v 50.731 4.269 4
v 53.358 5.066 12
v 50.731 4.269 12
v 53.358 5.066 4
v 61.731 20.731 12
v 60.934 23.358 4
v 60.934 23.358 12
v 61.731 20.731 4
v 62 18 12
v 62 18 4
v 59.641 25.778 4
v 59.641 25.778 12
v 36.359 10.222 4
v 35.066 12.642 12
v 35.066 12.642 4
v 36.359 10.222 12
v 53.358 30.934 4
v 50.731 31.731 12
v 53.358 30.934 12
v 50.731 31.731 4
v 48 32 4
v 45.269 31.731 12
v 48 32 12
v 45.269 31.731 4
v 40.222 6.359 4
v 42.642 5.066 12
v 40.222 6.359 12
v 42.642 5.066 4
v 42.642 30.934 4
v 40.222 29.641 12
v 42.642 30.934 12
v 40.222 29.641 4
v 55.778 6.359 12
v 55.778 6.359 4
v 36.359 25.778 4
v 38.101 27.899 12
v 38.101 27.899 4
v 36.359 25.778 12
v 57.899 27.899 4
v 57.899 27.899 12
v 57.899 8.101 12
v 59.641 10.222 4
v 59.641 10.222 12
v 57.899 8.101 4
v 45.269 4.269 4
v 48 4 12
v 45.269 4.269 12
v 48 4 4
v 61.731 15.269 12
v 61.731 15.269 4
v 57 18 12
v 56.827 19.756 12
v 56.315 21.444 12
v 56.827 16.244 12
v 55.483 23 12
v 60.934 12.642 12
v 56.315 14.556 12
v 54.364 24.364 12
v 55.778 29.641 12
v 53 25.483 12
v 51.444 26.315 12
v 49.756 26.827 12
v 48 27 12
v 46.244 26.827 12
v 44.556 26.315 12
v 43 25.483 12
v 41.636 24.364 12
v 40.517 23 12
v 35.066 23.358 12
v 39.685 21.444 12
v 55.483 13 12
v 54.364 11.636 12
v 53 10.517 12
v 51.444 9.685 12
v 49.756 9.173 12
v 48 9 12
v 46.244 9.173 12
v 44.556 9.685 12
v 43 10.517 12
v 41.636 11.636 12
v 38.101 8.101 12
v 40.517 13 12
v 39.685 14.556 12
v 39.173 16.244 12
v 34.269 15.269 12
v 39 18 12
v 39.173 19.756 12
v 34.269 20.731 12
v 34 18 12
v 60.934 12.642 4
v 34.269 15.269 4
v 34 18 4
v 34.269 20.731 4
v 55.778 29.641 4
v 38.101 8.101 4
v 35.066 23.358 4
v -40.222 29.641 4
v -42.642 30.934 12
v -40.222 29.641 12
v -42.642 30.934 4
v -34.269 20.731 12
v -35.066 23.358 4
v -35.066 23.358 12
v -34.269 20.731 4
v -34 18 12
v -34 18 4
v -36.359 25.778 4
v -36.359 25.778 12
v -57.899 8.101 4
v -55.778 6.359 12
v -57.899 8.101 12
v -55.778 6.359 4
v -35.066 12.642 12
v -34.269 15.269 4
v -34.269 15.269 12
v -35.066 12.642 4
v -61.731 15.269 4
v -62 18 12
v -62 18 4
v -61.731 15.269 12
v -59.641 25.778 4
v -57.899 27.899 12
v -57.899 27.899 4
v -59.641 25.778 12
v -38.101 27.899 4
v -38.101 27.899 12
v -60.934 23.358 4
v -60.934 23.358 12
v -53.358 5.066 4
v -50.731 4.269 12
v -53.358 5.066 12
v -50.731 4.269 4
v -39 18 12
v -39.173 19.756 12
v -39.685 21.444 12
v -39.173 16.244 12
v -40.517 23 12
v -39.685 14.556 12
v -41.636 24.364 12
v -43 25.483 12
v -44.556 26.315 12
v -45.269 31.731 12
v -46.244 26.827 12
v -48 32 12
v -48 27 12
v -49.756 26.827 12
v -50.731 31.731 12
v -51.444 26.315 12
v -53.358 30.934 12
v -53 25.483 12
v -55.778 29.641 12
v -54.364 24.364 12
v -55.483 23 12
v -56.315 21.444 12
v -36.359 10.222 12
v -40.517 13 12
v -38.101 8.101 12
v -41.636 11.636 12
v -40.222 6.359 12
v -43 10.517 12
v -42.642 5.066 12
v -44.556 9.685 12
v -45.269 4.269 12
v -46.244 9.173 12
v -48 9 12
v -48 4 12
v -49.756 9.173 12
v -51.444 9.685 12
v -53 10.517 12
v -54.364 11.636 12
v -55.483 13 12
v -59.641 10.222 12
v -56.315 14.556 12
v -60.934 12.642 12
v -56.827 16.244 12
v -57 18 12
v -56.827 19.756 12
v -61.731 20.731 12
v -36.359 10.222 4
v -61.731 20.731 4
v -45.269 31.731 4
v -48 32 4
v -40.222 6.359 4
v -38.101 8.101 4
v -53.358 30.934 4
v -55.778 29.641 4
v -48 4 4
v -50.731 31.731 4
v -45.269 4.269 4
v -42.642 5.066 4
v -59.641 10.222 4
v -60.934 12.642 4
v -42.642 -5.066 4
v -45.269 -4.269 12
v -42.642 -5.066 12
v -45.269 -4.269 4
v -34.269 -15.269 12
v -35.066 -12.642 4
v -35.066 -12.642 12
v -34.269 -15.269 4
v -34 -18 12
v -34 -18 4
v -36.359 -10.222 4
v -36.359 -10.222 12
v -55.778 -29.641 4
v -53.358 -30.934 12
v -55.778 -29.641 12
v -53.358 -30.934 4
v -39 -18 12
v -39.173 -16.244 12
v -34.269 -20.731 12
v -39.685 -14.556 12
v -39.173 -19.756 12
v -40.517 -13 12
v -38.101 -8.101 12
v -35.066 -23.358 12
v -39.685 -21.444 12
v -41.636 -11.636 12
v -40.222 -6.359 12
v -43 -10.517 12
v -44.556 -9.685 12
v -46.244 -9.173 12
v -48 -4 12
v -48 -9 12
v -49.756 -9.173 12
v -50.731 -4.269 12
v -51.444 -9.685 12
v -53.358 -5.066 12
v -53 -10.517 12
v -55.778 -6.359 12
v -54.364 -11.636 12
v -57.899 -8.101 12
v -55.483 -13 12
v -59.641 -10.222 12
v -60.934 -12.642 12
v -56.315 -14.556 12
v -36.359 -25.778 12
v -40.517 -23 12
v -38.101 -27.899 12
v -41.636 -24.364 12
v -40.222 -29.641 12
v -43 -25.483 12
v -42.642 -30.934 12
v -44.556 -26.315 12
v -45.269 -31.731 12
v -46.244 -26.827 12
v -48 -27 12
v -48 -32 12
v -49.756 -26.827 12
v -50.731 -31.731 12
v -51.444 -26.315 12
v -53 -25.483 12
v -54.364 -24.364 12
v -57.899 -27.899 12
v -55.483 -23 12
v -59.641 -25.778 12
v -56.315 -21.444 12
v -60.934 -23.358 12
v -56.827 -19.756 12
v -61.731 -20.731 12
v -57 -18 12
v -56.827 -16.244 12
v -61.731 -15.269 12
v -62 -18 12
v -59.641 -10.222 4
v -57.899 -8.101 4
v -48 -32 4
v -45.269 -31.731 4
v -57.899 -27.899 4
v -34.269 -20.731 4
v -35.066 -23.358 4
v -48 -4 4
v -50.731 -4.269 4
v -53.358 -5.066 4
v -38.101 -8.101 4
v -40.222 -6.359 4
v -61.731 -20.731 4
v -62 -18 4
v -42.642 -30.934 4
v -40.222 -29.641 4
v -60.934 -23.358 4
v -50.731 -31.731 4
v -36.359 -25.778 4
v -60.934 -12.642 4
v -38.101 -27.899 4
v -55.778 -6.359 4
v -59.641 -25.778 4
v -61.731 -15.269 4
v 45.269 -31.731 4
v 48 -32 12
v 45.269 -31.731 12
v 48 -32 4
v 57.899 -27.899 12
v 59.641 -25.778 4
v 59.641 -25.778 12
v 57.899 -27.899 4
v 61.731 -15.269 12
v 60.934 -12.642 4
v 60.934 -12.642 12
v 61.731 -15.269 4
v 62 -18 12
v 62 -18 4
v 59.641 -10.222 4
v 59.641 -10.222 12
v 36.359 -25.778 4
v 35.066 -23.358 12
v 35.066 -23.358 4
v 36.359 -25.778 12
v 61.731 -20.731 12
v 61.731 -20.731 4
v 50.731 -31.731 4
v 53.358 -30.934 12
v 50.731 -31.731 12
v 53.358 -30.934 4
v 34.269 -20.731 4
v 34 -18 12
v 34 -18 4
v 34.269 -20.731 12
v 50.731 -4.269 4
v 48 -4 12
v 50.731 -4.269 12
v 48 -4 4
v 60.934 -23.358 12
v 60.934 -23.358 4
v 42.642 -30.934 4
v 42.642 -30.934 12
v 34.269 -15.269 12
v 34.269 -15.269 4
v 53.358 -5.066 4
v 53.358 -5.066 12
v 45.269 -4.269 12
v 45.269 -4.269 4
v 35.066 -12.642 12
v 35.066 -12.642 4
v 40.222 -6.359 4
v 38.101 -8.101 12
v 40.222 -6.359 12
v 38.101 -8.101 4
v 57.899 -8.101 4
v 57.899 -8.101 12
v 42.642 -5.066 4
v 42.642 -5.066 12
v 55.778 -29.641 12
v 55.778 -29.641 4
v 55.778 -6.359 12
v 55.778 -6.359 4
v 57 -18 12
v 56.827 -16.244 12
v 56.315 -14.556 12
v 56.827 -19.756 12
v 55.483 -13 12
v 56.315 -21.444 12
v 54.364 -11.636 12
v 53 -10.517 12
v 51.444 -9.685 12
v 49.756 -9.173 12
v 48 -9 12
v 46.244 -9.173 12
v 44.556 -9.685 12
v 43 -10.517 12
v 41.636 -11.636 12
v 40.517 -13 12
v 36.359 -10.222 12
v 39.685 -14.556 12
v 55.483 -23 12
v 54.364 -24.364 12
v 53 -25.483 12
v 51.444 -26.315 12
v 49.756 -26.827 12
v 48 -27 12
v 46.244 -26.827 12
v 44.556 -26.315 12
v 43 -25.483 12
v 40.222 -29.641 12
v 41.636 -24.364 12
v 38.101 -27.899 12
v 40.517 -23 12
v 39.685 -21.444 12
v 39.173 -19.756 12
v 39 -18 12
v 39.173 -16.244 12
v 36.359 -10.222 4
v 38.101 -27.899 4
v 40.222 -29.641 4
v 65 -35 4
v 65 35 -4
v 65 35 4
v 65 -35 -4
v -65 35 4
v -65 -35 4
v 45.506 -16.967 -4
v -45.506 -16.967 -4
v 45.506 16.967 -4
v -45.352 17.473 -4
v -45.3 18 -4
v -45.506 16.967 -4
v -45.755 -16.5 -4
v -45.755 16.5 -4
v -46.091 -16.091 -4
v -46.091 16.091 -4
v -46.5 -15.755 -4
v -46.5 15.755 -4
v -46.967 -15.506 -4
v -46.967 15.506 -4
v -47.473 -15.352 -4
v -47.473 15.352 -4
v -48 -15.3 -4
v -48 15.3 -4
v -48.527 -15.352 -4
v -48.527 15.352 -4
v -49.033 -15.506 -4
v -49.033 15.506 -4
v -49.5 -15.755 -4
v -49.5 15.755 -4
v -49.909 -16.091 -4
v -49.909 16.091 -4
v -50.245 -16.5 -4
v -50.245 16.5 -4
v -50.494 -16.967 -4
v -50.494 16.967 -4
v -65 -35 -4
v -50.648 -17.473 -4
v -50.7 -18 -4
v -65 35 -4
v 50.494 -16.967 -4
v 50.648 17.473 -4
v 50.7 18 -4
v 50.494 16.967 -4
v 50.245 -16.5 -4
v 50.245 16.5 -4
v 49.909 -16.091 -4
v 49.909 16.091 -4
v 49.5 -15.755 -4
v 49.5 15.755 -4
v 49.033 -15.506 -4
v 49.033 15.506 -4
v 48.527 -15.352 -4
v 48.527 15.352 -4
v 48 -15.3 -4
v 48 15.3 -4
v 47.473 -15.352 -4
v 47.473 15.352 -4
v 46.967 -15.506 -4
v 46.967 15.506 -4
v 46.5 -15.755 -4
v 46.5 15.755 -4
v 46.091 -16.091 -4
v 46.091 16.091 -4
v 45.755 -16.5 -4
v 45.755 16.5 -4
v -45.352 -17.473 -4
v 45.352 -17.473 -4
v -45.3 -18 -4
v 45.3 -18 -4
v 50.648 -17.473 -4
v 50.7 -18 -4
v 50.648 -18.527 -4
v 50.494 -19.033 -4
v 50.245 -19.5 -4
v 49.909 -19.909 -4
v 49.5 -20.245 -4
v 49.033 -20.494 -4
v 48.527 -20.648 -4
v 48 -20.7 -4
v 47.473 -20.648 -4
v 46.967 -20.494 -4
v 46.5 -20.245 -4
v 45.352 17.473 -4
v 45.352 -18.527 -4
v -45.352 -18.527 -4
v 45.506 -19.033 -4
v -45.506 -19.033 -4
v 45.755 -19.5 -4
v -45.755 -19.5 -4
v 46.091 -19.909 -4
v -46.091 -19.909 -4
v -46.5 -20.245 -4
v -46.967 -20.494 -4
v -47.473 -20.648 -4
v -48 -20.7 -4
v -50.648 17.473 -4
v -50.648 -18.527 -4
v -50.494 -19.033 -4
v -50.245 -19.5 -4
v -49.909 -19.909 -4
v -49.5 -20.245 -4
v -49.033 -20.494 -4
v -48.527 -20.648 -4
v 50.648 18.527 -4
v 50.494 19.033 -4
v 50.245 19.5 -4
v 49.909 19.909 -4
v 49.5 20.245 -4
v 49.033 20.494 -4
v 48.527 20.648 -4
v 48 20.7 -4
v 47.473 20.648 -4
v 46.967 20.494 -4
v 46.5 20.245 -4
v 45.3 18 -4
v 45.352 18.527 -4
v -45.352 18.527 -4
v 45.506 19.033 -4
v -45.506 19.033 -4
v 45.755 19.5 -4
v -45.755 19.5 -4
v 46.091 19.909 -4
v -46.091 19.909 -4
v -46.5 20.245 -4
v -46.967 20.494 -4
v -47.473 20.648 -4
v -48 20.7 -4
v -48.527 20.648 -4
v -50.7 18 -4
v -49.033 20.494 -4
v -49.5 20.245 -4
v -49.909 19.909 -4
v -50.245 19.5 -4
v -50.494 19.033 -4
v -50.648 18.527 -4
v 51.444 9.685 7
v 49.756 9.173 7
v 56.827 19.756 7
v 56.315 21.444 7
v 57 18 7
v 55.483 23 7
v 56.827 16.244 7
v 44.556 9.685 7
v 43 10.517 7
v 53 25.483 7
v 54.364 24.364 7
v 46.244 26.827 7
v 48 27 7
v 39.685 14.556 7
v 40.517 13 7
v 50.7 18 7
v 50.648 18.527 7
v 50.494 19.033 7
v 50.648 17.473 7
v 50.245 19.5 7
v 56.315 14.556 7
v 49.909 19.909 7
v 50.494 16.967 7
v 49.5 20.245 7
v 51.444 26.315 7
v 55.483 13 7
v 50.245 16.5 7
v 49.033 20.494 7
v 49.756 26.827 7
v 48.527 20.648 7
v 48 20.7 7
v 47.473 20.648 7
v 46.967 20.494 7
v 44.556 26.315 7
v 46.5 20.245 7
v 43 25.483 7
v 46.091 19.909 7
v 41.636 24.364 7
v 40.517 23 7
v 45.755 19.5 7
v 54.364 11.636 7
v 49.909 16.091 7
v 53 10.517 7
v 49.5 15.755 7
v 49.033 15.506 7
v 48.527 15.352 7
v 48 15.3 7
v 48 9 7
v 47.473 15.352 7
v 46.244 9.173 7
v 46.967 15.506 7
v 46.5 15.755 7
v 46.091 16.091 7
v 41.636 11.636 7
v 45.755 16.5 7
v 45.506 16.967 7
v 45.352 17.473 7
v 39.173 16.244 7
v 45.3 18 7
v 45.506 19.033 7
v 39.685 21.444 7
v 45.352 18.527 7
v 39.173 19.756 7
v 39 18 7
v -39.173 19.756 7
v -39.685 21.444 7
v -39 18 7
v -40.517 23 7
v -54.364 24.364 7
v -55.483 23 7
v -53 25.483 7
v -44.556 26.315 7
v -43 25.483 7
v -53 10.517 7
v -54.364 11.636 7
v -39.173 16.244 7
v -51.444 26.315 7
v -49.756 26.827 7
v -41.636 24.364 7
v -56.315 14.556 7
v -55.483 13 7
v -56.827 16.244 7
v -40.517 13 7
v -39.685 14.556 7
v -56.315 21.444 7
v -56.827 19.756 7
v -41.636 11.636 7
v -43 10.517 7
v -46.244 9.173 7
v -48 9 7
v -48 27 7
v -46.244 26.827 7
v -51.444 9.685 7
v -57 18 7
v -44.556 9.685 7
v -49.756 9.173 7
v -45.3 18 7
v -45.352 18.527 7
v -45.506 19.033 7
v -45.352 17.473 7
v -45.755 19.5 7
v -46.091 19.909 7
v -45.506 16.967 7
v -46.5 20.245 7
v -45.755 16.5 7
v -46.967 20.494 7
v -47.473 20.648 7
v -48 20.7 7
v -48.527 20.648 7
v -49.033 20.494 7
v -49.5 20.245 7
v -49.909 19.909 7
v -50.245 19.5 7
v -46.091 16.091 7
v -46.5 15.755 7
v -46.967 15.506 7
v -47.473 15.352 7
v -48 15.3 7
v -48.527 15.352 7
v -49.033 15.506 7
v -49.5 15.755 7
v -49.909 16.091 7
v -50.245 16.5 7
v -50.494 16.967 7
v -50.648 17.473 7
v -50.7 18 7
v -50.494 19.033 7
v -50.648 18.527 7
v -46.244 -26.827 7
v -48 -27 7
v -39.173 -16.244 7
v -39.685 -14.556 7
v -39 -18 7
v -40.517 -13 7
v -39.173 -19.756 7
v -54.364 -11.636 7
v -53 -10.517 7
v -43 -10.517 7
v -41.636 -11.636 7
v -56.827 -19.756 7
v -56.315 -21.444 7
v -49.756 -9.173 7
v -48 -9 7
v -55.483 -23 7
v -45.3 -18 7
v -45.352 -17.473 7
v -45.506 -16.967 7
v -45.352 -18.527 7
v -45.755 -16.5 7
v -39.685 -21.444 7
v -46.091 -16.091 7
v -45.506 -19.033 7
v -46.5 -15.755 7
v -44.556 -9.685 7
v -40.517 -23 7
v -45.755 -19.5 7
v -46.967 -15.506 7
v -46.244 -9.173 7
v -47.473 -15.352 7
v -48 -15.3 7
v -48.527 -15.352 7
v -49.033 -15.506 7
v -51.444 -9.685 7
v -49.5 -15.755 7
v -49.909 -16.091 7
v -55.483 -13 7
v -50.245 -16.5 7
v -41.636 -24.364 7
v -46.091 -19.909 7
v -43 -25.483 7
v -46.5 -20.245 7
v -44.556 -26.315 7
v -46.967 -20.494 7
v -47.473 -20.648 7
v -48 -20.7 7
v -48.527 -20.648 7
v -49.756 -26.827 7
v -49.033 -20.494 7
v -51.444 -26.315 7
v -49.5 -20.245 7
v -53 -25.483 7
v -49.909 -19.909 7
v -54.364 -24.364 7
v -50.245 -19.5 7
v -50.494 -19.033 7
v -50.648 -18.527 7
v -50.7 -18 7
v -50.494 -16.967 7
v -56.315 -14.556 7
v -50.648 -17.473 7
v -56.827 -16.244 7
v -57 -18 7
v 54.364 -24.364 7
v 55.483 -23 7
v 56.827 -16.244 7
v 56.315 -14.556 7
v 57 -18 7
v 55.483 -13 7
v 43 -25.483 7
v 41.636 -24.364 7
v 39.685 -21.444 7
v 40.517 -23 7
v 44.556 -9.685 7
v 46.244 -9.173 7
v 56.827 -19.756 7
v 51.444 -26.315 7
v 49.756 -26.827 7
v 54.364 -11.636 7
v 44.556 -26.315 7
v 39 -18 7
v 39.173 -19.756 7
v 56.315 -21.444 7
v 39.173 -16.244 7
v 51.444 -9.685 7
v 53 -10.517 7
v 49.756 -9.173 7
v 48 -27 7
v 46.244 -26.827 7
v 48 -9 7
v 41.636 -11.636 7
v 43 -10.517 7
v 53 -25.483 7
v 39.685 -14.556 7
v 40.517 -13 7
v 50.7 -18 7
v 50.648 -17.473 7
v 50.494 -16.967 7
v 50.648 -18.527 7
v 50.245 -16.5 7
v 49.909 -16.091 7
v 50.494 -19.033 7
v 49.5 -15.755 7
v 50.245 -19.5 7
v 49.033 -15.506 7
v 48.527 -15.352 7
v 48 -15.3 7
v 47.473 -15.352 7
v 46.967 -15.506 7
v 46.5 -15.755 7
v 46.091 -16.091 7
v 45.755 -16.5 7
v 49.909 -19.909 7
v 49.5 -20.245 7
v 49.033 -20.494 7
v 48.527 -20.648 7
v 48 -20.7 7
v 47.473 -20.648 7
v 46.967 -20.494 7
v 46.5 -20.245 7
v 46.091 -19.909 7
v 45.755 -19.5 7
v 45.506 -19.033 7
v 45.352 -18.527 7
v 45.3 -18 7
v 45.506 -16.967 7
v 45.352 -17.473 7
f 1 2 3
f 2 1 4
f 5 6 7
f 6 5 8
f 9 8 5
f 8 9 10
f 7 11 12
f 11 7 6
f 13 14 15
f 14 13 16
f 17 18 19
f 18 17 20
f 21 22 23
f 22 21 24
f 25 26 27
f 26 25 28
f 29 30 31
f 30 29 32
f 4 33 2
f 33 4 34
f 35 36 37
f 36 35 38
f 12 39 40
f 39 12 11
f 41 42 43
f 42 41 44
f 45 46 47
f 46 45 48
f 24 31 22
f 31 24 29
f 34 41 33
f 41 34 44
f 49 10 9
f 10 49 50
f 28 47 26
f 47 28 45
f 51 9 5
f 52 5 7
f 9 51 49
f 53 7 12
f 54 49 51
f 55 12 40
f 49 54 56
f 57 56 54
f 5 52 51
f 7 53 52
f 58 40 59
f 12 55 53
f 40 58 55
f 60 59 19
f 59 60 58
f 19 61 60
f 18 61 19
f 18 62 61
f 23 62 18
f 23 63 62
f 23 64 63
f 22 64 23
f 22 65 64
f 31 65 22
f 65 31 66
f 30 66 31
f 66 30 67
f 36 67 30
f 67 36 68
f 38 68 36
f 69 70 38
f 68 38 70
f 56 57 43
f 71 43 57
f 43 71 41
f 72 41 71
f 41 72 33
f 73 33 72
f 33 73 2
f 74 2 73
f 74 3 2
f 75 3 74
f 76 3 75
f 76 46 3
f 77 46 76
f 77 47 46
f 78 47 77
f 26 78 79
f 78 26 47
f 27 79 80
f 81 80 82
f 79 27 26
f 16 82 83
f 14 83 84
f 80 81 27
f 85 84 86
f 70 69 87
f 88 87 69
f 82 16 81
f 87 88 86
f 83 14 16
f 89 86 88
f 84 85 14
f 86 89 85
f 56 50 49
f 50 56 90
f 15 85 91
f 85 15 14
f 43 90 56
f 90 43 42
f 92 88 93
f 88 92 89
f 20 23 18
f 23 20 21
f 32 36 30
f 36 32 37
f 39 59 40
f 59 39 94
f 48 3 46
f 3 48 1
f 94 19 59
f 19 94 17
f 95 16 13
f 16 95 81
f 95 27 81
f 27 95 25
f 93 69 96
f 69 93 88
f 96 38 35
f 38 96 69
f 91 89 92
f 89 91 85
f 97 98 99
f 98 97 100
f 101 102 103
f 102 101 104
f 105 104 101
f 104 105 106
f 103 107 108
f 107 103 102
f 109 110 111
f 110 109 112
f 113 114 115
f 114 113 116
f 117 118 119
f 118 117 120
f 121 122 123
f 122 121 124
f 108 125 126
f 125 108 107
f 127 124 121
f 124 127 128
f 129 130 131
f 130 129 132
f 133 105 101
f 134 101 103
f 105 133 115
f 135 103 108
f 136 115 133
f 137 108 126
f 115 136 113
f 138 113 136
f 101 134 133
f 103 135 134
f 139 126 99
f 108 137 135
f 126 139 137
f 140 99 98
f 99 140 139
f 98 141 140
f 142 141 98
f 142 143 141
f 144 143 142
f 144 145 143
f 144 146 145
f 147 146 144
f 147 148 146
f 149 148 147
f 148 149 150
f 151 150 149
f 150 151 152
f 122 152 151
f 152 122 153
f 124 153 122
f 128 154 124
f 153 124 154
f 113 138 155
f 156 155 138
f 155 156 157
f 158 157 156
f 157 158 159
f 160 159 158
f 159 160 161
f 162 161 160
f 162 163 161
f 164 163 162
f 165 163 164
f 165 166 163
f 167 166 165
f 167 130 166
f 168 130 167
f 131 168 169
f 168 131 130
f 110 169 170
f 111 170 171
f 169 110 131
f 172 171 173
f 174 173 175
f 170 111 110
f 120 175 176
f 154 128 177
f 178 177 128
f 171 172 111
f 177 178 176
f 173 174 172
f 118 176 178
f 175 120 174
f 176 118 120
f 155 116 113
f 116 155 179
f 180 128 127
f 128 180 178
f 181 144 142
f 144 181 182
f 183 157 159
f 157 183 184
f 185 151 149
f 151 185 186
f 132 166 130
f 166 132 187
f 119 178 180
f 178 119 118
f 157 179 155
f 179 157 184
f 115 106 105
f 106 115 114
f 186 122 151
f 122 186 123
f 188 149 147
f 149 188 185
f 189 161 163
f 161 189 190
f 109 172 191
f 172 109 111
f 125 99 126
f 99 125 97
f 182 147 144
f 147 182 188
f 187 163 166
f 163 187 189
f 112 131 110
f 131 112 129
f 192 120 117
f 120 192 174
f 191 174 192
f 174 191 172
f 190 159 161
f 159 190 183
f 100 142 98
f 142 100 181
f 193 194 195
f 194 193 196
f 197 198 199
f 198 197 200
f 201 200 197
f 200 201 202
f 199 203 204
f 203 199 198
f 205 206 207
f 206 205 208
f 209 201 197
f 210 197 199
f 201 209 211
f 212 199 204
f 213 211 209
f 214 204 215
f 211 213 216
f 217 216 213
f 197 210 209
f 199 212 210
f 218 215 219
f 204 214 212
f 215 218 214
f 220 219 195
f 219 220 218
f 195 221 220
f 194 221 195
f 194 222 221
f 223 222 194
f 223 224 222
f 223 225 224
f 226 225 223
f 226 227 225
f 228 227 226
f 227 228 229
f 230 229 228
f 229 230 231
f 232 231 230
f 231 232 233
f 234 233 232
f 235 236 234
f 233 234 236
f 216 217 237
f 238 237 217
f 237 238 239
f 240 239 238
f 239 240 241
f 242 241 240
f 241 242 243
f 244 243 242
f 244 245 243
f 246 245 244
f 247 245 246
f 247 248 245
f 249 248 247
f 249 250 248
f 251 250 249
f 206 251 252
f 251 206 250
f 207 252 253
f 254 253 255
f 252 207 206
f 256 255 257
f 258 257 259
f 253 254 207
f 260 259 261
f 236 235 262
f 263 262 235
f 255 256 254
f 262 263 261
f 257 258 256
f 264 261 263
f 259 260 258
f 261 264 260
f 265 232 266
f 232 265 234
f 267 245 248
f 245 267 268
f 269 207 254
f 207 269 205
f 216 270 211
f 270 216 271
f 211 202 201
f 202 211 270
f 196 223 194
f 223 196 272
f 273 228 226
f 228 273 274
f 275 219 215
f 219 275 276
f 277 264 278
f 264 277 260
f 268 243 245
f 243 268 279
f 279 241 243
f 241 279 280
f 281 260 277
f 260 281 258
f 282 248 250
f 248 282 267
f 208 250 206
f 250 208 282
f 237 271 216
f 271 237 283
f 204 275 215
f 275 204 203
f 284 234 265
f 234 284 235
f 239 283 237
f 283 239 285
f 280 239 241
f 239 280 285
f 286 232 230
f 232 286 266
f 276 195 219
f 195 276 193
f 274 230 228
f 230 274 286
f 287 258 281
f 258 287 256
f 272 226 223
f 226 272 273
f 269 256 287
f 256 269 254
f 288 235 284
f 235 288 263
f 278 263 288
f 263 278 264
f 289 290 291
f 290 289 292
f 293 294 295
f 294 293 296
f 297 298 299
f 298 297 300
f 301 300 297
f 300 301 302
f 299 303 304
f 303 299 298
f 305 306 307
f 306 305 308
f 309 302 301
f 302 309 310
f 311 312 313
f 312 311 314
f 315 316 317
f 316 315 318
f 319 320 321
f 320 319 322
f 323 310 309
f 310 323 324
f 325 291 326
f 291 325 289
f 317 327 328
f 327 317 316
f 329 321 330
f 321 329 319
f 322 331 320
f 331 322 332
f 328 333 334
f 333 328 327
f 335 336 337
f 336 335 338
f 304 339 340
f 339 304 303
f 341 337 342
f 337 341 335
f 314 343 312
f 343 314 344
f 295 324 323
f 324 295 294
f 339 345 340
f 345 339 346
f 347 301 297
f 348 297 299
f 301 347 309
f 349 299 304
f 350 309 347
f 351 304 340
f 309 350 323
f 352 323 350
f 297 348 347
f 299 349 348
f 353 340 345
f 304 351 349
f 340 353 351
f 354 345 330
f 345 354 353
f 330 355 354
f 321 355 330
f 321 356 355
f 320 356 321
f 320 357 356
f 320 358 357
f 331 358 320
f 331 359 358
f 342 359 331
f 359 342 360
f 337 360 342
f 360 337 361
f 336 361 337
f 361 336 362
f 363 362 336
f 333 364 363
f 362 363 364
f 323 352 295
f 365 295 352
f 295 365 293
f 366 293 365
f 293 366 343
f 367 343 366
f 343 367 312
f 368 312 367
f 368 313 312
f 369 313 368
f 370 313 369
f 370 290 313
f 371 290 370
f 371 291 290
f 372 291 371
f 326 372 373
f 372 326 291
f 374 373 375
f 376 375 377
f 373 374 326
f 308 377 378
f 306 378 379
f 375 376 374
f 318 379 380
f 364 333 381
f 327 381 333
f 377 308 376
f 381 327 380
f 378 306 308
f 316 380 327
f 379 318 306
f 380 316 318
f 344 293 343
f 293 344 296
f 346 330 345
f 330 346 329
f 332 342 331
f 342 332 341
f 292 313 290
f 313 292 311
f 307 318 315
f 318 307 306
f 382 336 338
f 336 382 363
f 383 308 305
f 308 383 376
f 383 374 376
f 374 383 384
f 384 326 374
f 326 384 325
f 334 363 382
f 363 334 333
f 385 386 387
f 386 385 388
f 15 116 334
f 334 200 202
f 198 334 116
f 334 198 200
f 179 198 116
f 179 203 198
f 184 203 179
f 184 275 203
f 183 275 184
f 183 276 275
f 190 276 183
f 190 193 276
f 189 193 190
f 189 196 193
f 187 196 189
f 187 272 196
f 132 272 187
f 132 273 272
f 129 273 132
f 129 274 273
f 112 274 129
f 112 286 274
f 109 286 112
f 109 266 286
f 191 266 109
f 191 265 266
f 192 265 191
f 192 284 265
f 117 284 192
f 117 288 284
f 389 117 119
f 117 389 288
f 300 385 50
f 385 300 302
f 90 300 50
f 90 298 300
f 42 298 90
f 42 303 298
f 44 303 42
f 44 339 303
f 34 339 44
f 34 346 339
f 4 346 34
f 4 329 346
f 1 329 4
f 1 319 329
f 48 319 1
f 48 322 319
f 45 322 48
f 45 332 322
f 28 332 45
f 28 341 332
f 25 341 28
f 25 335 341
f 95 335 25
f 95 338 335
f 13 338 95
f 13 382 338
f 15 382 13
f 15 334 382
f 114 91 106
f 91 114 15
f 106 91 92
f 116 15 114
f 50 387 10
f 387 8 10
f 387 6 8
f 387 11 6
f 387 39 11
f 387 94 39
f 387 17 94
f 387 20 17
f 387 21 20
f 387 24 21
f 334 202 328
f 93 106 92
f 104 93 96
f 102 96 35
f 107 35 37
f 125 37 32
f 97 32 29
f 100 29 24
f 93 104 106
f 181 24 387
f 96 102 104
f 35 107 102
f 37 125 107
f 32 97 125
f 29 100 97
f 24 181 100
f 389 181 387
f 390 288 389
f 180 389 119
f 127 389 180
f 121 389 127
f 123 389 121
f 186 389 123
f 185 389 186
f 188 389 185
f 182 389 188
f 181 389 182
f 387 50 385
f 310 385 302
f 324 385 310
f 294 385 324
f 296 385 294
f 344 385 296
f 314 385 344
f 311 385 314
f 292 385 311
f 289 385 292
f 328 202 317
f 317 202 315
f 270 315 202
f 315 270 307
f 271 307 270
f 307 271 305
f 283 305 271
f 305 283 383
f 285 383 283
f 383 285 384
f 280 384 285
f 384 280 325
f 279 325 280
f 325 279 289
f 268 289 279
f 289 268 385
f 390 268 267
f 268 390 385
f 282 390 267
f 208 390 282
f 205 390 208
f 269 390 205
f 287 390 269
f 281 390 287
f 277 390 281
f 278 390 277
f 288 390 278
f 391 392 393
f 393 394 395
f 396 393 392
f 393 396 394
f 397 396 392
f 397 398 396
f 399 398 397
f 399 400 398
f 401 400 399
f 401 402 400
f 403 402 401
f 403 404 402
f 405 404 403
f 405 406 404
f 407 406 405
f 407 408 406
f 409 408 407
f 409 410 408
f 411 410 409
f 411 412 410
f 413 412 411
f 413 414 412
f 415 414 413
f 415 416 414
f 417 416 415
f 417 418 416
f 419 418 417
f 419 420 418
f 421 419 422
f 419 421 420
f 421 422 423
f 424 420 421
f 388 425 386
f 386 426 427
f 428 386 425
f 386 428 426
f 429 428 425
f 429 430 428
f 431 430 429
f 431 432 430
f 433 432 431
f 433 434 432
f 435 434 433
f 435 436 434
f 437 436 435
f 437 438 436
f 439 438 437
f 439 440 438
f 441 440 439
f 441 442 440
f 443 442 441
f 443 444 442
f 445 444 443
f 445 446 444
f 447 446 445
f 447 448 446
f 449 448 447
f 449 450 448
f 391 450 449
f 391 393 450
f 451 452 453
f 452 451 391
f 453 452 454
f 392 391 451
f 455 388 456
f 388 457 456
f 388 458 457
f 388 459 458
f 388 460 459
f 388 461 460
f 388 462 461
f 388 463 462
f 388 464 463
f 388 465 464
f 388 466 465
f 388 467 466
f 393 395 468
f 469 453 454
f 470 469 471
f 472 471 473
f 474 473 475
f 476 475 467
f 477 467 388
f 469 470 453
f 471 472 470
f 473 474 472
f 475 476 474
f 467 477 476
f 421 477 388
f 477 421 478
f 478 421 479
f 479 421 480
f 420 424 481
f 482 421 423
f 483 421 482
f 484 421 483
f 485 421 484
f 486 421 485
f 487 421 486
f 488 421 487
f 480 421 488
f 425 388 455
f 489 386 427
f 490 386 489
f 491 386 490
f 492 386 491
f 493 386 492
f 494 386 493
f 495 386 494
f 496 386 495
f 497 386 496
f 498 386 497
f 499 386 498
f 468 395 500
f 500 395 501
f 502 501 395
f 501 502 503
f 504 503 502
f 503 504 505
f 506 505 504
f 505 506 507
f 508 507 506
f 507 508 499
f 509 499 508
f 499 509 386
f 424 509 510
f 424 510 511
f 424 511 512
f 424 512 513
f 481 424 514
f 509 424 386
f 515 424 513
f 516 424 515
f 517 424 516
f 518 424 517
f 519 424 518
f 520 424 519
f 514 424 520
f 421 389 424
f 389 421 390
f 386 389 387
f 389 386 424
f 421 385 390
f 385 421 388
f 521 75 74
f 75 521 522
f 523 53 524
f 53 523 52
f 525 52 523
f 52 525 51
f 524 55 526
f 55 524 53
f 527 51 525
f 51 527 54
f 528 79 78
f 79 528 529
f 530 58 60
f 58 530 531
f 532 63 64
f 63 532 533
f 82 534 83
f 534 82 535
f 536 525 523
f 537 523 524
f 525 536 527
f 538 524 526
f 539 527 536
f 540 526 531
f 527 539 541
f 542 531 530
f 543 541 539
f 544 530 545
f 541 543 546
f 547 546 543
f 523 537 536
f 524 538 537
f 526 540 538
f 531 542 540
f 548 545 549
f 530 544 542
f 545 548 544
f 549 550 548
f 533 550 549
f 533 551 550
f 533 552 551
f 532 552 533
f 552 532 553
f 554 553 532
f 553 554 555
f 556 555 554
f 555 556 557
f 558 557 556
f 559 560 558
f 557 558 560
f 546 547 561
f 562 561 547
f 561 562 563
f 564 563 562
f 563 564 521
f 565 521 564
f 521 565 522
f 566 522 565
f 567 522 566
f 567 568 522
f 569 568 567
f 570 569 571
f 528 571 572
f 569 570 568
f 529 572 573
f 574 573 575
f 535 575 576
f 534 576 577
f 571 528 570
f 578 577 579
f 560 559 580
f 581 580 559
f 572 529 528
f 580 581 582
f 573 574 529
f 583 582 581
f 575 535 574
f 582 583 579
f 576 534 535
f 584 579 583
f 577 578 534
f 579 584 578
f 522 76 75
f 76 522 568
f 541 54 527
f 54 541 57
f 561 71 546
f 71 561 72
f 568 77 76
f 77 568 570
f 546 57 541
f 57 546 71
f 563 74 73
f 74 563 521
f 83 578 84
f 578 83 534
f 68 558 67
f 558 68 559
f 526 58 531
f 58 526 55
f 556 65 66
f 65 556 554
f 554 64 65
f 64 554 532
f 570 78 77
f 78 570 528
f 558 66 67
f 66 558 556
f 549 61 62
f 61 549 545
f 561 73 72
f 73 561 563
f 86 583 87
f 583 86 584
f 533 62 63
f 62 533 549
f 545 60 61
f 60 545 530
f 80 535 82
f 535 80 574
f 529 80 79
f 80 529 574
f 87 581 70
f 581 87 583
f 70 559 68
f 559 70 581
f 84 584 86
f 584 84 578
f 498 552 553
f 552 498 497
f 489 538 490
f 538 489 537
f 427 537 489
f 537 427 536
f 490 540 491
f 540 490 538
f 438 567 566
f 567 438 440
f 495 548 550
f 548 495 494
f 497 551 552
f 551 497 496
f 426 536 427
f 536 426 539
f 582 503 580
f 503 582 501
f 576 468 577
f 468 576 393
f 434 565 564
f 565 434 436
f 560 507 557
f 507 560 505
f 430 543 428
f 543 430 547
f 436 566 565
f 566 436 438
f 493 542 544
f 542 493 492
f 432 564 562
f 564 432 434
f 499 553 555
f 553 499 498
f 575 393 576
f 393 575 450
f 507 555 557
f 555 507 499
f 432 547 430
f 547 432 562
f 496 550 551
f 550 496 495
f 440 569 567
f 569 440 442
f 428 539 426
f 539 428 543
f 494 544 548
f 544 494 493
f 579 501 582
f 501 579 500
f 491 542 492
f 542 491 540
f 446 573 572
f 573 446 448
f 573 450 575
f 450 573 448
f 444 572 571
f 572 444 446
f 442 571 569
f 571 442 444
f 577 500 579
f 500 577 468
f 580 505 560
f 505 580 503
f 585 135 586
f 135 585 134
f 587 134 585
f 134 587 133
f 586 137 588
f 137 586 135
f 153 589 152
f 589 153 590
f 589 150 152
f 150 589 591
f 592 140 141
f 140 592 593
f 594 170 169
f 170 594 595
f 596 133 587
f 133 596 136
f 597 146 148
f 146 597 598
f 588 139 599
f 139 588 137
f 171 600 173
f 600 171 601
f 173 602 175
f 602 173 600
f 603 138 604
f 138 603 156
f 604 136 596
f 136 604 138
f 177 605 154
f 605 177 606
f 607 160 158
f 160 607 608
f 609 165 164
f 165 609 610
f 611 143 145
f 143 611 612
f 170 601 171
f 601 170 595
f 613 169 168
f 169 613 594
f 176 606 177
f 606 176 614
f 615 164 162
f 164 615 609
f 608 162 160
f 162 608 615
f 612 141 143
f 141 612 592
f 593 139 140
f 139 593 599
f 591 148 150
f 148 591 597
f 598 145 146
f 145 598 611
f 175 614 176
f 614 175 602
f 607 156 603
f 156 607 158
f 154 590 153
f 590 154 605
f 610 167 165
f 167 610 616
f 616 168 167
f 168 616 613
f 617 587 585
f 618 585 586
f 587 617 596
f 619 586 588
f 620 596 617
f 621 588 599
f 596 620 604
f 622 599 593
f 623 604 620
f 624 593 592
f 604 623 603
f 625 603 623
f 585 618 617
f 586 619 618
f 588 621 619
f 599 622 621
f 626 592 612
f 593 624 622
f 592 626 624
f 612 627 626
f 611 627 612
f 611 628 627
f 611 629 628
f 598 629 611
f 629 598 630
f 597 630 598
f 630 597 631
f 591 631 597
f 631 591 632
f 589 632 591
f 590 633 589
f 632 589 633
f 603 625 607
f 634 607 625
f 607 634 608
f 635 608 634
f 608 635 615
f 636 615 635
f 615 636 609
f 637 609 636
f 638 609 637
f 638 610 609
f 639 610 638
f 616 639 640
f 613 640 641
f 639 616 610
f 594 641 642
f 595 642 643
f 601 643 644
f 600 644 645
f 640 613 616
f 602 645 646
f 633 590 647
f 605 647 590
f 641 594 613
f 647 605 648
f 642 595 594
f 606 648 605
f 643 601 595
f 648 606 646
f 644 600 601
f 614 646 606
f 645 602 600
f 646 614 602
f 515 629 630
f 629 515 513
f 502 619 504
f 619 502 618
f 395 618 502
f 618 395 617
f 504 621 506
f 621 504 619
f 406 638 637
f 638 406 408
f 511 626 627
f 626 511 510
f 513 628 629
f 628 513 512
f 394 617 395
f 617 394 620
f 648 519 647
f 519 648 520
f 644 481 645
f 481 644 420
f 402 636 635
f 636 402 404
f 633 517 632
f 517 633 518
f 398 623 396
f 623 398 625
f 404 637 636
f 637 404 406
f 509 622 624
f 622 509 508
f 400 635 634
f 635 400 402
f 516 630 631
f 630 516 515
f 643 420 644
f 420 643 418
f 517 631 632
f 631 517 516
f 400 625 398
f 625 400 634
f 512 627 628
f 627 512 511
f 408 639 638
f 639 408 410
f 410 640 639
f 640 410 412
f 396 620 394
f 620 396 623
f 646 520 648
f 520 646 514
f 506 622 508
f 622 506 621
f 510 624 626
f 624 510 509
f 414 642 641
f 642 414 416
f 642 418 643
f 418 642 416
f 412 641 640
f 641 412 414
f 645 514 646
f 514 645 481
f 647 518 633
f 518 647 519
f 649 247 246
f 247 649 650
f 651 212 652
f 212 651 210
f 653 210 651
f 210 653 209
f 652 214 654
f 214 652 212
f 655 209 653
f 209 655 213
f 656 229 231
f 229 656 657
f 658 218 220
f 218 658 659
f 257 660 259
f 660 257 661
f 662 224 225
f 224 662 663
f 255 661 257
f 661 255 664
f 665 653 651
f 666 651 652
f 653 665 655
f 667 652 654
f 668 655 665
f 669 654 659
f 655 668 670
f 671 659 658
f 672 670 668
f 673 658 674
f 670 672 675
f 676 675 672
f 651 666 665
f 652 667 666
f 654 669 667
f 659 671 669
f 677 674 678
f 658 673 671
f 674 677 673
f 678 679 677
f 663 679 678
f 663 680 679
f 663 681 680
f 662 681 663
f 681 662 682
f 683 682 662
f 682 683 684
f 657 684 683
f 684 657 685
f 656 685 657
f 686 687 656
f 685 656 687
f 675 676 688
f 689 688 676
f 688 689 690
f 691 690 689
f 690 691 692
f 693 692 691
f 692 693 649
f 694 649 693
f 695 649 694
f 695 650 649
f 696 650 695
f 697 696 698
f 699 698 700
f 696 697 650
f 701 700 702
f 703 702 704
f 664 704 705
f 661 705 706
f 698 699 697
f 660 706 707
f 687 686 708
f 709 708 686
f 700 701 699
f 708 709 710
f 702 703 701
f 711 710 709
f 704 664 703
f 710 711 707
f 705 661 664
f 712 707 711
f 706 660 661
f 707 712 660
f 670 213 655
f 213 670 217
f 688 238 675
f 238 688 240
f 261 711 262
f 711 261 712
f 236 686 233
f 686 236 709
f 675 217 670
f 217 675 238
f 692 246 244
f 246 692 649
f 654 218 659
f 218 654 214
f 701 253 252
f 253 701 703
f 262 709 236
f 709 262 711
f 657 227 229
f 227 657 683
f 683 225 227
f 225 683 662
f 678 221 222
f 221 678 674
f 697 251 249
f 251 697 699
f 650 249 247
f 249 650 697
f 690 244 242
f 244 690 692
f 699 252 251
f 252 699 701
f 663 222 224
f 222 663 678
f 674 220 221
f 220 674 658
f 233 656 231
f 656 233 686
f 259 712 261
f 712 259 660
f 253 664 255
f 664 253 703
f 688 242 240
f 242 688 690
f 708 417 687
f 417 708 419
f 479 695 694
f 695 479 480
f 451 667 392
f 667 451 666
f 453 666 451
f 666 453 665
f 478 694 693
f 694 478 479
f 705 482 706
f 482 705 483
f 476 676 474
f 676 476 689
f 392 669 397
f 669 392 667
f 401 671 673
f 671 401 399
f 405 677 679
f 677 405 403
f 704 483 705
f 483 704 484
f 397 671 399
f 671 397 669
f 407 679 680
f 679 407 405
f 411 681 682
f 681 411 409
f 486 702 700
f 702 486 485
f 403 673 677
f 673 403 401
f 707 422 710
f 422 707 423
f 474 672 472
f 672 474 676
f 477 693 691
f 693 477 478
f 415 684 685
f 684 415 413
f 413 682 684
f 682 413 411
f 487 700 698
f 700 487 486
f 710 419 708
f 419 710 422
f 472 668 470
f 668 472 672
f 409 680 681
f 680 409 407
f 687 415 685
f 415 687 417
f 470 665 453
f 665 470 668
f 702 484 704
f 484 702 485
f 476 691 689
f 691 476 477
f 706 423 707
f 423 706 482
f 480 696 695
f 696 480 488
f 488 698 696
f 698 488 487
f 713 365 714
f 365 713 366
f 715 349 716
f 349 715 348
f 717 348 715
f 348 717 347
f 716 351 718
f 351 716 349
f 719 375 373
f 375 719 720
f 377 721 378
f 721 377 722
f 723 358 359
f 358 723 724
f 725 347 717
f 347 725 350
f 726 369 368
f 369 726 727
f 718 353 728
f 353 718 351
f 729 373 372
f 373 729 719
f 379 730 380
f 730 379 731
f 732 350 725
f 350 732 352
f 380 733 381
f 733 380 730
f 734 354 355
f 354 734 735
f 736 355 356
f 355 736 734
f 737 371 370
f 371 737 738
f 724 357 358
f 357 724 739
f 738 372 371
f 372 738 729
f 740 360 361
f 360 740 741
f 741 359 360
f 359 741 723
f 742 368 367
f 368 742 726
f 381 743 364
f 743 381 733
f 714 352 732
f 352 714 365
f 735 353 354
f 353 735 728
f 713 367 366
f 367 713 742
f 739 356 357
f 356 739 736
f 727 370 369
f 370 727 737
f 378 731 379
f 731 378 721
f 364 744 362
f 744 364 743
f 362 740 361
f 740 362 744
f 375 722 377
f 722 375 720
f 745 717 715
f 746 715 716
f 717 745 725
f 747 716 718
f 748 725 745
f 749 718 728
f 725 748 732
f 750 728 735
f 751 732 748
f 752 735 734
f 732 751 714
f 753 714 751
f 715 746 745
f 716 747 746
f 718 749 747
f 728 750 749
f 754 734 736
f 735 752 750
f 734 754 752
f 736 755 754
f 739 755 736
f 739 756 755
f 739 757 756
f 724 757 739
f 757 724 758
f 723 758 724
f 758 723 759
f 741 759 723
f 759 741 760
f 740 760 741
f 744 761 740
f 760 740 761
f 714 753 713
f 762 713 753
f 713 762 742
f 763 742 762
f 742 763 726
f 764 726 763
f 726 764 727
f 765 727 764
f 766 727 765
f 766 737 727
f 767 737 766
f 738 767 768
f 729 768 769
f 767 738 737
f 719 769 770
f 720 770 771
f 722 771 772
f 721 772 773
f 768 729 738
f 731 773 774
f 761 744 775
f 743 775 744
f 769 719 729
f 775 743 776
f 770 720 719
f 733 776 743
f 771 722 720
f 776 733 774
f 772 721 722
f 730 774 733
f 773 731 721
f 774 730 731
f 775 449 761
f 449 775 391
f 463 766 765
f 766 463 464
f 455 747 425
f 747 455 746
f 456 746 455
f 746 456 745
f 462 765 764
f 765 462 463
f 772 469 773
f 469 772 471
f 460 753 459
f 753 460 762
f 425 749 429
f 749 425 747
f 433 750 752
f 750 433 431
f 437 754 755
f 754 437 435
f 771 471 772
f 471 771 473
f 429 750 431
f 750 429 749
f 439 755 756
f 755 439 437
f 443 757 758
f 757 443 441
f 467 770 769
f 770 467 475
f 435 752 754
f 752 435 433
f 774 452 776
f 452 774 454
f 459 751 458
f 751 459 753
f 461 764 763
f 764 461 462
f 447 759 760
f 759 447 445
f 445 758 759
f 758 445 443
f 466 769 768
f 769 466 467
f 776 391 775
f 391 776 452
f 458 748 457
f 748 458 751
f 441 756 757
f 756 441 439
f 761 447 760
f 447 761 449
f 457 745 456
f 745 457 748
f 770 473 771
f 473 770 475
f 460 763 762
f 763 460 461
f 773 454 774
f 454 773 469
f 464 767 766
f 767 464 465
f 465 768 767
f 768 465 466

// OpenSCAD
$fn = 32;

// ----------------------------------------------------------------------
// Socket pad plate
// bosses with counterbored sockets for the screws
// ----------------------------------------------------------------------

// --- parameters (mm) ---
base_t = 8;            // base plate thickness
boss_h = 8;            // boss height above the base plate
boss_d = 28;           // boss diameter
socket_d = 18;         // socket diameter
socket_depth = 5;      // socket depth from the boss face
bolt_d = 5.4;          // screw clearance hole through the socket floor
plate = [130, 70, 8];  // overall size (x, y, z)
edge = 17;             // boss centre offset from the plate edge
pads = 4;              // boss count, one per corner

// --- derived feature positions (mm) ---
height = base_t + boss_h;        // = 16   overall height of the part
corner_x = plate[0] / 2 - edge;  // = 48   boss centre X
corner_y = plate[1] / 2 - edge;  // = 18   boss centre Y
feature_centers = [
  [corner_x, corner_y],
  [-corner_x, corner_y],
  [-corner_x, -corner_y],
  [corner_x, -corner_y]
];   // boss centres: sockets, holes and the pads themselves are placed from here

// base plate, bosses on feature_centers, socket + through hole in each
difference() {
  union() {
    cube(plate, center = true);
    for (centre = feature_centers)
      translate([centre[0], centre[1], plate[2] / 2 - 1])
        cylinder(d = boss_d, h = boss_h + 1);
  }
  for (centre = feature_centers) {
    translate([centre[0], centre[1], plate[2] / 2 + boss_h - socket_depth])
      cylinder(d = socket_d, h = socket_depth + 1);
    translate([centre[0], centre[1], -height])
      cylinder(d = bolt_d, h = 2 * height + 2);  // through the socket floor
  }
}
